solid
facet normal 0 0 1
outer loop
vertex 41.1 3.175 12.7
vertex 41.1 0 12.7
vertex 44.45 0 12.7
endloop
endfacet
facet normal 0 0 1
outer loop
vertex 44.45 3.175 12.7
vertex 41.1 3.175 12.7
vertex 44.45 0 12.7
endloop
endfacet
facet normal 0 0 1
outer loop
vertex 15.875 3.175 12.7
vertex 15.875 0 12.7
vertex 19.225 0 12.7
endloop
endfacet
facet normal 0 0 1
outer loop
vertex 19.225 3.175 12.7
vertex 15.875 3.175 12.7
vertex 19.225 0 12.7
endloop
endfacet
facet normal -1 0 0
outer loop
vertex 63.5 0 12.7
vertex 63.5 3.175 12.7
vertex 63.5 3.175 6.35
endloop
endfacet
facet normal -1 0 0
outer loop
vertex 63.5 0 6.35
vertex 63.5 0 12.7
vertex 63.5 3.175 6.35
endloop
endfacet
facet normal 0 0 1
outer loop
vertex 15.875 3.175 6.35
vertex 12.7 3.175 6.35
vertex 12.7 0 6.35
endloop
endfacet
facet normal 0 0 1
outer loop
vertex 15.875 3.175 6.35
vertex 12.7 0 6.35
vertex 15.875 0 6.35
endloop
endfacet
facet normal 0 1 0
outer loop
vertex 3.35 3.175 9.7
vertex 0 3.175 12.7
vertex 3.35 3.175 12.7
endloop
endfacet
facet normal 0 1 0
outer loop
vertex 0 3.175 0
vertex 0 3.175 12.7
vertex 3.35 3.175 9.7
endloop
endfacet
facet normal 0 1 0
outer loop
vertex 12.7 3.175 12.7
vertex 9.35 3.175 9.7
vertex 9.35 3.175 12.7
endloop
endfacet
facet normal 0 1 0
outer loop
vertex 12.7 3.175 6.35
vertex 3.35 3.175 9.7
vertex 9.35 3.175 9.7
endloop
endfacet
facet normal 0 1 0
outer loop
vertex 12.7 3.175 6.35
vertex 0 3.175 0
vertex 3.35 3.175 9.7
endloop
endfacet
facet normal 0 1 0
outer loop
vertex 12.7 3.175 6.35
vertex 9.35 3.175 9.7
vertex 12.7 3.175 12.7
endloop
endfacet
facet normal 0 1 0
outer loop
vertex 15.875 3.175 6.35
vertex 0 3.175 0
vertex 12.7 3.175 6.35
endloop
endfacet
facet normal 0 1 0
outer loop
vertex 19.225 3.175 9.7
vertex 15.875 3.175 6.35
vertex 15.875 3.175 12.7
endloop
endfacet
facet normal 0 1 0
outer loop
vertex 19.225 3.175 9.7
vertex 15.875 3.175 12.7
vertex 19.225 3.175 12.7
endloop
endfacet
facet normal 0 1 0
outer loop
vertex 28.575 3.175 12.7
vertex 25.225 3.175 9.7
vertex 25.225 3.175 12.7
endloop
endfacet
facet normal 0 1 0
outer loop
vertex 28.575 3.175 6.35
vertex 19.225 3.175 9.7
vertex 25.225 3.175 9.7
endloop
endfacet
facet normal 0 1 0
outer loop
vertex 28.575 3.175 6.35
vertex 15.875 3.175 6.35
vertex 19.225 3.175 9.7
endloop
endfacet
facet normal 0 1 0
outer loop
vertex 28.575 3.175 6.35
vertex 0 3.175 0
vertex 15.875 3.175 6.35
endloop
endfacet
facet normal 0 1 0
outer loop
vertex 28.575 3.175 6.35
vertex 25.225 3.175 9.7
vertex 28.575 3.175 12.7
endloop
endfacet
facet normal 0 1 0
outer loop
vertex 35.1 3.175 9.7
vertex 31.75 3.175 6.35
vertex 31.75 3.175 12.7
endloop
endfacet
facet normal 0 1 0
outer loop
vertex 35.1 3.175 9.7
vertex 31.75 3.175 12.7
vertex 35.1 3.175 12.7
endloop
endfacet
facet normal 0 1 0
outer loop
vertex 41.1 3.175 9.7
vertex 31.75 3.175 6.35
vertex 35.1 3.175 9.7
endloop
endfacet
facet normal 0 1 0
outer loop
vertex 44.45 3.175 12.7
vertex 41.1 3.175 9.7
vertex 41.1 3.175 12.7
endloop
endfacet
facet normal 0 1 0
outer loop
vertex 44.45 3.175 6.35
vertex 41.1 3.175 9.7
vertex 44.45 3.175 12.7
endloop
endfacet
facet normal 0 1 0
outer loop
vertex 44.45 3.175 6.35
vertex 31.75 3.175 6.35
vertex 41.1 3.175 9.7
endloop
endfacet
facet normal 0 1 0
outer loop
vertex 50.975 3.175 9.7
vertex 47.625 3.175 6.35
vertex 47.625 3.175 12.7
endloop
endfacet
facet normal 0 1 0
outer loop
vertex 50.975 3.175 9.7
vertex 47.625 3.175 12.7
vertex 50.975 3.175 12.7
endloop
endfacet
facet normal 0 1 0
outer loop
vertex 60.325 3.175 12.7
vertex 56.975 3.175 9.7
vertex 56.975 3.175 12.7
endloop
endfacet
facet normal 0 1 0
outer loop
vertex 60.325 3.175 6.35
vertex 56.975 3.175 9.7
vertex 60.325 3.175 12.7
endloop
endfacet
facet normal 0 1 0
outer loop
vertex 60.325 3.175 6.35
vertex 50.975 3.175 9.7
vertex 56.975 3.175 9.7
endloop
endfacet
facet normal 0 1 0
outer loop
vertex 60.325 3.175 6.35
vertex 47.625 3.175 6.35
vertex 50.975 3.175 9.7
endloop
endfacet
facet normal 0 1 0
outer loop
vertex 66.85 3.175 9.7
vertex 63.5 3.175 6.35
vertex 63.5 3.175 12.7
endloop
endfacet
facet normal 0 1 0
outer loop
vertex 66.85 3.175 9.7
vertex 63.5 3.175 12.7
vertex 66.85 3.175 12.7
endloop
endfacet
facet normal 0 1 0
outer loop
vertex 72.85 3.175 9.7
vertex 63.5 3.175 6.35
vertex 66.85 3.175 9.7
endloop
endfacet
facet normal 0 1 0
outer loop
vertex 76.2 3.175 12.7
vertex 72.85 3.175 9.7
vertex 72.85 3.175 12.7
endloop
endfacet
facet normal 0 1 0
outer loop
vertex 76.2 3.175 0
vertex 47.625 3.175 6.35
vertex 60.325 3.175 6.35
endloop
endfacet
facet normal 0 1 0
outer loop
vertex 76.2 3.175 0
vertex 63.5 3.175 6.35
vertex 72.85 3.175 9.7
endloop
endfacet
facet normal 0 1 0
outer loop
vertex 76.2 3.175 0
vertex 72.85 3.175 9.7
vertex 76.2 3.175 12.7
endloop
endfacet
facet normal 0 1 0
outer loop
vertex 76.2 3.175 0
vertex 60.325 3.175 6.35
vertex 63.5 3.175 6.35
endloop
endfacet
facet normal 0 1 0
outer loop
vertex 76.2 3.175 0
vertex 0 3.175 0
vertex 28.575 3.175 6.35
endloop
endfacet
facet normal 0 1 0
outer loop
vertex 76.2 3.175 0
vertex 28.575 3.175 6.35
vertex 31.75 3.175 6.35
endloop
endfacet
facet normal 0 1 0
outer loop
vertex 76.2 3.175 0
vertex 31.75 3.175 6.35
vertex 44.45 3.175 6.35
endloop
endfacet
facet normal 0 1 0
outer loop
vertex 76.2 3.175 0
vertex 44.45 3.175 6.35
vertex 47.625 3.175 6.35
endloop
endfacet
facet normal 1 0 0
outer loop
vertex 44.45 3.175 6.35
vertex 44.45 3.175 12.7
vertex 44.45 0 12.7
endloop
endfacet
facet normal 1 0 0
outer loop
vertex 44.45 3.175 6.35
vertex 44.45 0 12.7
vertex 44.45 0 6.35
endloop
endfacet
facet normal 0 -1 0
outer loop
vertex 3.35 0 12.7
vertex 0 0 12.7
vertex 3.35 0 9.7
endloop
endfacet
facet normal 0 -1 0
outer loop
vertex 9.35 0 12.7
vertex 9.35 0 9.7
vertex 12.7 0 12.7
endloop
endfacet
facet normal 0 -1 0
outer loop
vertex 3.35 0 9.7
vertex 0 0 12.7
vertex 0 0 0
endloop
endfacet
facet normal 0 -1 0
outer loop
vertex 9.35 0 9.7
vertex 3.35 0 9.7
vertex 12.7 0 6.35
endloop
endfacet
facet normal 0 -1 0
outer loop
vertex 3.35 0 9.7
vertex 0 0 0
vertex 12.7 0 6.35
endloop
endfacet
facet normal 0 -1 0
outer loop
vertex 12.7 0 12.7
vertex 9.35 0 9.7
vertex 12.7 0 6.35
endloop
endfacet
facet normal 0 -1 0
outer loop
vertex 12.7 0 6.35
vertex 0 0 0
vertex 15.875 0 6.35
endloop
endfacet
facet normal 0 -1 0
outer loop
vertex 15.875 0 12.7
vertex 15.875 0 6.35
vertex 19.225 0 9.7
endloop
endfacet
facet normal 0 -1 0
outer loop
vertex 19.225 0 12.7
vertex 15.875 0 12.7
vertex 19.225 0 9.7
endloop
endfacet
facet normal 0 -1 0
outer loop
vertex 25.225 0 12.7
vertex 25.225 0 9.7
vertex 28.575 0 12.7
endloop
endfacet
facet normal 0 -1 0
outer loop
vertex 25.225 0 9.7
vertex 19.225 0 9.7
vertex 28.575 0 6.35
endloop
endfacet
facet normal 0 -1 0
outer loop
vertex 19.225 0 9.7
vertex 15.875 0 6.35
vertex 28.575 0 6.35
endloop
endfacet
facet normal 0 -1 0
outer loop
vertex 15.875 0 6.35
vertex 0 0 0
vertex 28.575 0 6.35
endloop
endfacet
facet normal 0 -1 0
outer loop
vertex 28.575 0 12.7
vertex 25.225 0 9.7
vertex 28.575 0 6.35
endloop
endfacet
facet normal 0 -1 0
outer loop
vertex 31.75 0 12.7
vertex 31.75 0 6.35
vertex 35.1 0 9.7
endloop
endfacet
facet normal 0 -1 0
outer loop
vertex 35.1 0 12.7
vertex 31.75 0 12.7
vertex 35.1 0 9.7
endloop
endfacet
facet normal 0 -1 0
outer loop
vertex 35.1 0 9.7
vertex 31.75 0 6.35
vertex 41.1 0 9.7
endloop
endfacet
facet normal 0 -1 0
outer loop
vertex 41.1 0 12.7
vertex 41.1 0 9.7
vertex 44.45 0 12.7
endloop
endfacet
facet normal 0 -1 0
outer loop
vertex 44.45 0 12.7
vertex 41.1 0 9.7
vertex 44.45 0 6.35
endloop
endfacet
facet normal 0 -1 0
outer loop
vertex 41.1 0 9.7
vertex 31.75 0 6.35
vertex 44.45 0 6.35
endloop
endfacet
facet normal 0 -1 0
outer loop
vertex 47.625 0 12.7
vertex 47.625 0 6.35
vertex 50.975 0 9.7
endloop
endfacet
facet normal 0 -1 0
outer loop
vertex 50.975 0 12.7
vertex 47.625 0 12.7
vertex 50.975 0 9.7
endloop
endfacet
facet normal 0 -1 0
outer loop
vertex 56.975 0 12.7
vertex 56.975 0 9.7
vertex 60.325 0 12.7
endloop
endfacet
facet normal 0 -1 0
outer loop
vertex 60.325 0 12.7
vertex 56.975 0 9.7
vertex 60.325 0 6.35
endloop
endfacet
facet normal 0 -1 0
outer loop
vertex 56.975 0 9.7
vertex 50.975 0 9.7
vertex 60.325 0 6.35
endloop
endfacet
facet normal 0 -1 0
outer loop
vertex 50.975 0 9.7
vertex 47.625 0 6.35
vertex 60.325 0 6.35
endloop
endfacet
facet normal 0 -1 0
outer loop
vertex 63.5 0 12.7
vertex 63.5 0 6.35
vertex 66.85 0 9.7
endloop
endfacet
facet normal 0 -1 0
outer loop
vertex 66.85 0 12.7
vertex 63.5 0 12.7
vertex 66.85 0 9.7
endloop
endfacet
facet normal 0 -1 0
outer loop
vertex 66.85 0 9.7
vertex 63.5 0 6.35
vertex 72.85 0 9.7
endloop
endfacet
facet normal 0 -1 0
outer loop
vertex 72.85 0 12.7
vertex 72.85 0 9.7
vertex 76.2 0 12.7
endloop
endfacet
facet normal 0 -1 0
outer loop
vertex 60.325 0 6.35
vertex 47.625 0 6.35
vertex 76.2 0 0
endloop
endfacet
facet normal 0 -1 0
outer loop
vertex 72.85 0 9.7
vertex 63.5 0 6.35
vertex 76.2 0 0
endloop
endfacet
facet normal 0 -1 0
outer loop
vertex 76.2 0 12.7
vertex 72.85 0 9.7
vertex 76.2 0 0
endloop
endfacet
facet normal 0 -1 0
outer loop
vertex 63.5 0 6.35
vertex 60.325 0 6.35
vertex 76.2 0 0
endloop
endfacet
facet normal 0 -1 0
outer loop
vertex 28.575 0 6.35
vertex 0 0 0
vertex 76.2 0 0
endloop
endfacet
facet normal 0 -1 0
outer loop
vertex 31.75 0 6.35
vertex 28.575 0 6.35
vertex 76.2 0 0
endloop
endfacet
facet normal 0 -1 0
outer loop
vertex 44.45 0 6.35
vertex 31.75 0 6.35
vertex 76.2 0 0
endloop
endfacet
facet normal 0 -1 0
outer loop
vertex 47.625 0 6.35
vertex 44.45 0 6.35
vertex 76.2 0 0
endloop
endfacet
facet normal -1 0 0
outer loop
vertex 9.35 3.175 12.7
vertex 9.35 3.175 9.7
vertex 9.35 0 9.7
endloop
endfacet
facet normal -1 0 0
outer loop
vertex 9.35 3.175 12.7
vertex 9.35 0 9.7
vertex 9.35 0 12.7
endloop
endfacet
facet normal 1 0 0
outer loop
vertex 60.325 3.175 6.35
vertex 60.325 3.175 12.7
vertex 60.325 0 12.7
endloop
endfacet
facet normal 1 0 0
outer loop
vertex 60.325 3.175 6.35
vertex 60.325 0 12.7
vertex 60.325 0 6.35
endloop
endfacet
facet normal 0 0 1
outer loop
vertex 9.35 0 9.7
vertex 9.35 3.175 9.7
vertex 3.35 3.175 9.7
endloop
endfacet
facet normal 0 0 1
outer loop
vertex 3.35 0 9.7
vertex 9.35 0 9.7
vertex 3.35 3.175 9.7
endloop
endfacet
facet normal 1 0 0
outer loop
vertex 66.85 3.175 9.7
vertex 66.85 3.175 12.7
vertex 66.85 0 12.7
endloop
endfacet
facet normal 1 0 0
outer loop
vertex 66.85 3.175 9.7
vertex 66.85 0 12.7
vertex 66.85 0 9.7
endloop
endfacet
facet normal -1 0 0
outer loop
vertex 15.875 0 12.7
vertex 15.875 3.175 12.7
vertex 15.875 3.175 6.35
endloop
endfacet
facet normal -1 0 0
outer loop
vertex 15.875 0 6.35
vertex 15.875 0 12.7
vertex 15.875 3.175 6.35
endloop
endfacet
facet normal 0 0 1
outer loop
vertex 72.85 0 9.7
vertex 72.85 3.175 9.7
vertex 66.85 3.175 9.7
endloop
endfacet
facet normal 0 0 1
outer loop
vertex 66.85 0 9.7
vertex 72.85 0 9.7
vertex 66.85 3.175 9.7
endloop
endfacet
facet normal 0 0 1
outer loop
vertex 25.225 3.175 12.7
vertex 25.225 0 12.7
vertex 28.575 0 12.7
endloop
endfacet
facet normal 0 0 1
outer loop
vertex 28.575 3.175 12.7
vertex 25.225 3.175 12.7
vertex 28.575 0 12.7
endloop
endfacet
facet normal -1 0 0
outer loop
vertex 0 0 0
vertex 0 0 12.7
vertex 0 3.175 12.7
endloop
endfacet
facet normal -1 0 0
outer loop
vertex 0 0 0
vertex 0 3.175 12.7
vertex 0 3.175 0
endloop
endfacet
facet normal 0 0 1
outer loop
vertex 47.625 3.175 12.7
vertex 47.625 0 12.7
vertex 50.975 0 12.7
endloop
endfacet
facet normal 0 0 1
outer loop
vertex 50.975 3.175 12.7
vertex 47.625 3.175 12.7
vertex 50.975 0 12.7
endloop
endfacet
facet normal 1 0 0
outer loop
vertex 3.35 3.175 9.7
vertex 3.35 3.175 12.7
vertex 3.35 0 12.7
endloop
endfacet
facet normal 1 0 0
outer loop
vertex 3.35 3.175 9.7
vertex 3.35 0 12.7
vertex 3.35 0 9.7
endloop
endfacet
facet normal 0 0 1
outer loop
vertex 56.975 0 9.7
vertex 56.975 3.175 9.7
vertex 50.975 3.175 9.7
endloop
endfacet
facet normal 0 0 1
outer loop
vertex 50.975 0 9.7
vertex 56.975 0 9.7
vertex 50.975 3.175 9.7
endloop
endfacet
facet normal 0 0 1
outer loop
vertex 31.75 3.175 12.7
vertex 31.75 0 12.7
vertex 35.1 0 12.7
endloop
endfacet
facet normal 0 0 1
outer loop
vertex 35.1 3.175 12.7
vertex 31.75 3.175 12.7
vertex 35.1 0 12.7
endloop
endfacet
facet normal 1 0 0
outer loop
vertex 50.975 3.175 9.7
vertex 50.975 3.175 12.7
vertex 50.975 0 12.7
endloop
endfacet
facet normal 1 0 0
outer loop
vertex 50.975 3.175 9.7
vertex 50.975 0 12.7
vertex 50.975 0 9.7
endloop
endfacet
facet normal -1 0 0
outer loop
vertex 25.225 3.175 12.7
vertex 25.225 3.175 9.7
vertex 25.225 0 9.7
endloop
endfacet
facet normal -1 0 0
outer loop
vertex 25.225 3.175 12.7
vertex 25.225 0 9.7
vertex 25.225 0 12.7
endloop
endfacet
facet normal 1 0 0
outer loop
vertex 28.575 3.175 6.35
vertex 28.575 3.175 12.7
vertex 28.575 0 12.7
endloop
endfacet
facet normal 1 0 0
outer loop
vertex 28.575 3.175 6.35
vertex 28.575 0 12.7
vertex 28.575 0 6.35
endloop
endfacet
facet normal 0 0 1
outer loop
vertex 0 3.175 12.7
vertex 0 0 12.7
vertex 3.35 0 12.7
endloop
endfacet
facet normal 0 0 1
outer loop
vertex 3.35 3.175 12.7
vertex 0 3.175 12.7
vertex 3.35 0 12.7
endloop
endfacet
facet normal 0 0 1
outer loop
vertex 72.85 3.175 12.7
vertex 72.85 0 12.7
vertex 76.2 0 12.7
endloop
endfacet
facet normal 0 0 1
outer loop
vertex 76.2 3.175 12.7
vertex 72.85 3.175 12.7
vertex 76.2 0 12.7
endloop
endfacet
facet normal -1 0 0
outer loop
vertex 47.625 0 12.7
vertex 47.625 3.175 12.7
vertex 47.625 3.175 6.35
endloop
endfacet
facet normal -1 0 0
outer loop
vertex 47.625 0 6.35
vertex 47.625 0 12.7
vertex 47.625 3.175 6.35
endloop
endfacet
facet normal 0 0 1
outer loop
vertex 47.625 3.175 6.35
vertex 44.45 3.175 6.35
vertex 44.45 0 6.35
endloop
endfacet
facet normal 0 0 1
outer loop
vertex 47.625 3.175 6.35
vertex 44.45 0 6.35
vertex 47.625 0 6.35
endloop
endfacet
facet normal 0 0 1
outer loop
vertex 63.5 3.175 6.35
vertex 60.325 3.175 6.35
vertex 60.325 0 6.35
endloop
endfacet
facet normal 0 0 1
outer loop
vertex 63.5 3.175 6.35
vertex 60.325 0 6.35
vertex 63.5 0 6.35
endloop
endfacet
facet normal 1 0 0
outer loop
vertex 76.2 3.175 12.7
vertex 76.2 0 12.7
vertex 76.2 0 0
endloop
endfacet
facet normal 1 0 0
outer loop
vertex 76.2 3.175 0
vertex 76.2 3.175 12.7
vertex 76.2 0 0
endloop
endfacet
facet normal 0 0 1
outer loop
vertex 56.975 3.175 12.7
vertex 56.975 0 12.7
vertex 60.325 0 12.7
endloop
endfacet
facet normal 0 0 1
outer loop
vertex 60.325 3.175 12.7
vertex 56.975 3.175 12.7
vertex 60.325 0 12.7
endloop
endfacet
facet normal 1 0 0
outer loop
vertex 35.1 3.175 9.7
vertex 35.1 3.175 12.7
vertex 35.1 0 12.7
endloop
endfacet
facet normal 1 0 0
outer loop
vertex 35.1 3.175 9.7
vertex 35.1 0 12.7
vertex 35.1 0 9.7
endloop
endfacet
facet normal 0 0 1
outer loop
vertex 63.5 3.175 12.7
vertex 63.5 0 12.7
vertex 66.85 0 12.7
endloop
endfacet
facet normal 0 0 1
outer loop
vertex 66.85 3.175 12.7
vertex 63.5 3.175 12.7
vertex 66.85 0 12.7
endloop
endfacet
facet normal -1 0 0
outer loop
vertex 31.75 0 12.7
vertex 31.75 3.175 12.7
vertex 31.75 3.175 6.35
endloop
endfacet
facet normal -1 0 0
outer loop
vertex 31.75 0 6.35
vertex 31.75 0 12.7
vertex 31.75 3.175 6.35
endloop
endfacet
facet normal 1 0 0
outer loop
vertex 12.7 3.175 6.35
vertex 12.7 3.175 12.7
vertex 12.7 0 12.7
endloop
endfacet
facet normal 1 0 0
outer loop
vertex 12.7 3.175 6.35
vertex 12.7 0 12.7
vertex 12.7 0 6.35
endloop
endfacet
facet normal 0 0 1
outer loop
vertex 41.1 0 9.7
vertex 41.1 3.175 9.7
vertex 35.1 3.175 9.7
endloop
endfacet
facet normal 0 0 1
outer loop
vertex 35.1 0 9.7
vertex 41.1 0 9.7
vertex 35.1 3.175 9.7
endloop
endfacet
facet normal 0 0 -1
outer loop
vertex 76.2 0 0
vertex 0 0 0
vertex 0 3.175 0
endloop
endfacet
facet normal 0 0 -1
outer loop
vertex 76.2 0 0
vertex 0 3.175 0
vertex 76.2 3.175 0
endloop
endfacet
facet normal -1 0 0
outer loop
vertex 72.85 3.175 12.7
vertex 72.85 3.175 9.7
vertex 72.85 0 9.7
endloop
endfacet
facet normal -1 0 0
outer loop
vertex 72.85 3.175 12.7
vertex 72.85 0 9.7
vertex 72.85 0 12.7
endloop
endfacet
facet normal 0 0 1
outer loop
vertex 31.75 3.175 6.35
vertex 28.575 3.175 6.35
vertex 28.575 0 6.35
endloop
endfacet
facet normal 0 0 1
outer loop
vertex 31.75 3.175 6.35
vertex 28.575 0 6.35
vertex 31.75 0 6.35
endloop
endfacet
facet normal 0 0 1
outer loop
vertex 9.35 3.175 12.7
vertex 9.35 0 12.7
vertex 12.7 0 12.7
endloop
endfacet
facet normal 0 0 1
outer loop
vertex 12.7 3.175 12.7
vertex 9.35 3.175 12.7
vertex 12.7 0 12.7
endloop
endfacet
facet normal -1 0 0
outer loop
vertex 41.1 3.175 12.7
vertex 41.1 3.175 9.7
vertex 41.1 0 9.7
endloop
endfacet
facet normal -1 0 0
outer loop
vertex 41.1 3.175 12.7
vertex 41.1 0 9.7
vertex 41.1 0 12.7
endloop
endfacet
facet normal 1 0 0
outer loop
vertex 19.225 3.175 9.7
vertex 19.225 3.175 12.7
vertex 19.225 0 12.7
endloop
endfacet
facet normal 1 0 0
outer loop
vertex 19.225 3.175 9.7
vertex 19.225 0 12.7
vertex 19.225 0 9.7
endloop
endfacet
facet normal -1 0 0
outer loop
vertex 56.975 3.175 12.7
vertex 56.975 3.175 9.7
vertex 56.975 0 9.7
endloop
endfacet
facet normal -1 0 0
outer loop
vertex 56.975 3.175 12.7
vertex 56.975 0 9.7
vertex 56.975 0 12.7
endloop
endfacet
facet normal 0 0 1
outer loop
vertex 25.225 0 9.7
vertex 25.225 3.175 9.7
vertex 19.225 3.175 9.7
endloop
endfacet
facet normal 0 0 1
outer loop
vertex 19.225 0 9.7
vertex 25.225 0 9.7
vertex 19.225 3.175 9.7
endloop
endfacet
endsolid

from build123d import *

# Parameters (mm, degrees)
SKETCH1_W           = 76.2
SKETCH1_H           = 12.7
BOSS_EXTRUDE1_DEPTH = 3.175
SKETCH4_W           = 3.175
SKETCH4_H           = 6.35
CUT_EXTRUDE1_DEPTH  = 4.175
LPATTERN1_COUNT     = 4
LPATTERN1_PITCH     = 15.875
CUT_EXTRUDE2_DEPTH  = 4.175
LPATTERN2_COUNT     = 5
LPATTERN2_PITCH     = 15.875


with BuildPart() as part:
    # Sketch1 → Boss-Extrude1 (new body)
    with BuildSketch(Plane(origin=(0, 0, 0), x_dir=(1, 0, 0), z_dir=(0, 1, 0))):
        with Locations((38.1, -6.35)):
            Rectangle(SKETCH1_W, SKETCH1_H)
    extrude(amount=BOSS_EXTRUDE1_DEPTH)

    # Sketch4 → Cut-Extrude1 (cut, through all)
    with BuildSketch(Plane(origin=(0, 3.175, 0), x_dir=(1, 0, 0), z_dir=(0, 1, 0))):
        with Locations((14.2875, -9.525)):
            Rectangle(SKETCH4_W, SKETCH4_H)
    cut_extrude1 = extrude(amount=-CUT_EXTRUDE1_DEPTH, mode=Mode.SUBTRACT)

    # LPattern1: Cut-Extrude1 ×4
    with Locations(*[(i * LPATTERN1_PITCH, 0, 0) for i in range(1, LPATTERN1_COUNT)]):
        add(cut_extrude1, mode=Mode.SUBTRACT)

    # Sketch5 → Cut-Extrude2 (cut, through all)
    with BuildSketch(Plane(origin=(0, 3.175, 0), x_dir=(1, 0, 0), z_dir=(0, 1, 0))):
        Polygon((6.35, -9.7), (9.35, -9.7), (9.35, -12.7), (3.35, -12.7), (3.35, -9.7), align=None)
    cut_extrude2 = extrude(amount=-CUT_EXTRUDE2_DEPTH, mode=Mode.SUBTRACT)

    # LPattern2: Cut-Extrude2 ×5
    with Locations(*[(i * LPATTERN2_PITCH, 0, 0) for i in range(1, LPATTERN2_COUNT)]):
        add(cut_extrude2, mode=Mode.SUBTRACT)


solid = part.part
